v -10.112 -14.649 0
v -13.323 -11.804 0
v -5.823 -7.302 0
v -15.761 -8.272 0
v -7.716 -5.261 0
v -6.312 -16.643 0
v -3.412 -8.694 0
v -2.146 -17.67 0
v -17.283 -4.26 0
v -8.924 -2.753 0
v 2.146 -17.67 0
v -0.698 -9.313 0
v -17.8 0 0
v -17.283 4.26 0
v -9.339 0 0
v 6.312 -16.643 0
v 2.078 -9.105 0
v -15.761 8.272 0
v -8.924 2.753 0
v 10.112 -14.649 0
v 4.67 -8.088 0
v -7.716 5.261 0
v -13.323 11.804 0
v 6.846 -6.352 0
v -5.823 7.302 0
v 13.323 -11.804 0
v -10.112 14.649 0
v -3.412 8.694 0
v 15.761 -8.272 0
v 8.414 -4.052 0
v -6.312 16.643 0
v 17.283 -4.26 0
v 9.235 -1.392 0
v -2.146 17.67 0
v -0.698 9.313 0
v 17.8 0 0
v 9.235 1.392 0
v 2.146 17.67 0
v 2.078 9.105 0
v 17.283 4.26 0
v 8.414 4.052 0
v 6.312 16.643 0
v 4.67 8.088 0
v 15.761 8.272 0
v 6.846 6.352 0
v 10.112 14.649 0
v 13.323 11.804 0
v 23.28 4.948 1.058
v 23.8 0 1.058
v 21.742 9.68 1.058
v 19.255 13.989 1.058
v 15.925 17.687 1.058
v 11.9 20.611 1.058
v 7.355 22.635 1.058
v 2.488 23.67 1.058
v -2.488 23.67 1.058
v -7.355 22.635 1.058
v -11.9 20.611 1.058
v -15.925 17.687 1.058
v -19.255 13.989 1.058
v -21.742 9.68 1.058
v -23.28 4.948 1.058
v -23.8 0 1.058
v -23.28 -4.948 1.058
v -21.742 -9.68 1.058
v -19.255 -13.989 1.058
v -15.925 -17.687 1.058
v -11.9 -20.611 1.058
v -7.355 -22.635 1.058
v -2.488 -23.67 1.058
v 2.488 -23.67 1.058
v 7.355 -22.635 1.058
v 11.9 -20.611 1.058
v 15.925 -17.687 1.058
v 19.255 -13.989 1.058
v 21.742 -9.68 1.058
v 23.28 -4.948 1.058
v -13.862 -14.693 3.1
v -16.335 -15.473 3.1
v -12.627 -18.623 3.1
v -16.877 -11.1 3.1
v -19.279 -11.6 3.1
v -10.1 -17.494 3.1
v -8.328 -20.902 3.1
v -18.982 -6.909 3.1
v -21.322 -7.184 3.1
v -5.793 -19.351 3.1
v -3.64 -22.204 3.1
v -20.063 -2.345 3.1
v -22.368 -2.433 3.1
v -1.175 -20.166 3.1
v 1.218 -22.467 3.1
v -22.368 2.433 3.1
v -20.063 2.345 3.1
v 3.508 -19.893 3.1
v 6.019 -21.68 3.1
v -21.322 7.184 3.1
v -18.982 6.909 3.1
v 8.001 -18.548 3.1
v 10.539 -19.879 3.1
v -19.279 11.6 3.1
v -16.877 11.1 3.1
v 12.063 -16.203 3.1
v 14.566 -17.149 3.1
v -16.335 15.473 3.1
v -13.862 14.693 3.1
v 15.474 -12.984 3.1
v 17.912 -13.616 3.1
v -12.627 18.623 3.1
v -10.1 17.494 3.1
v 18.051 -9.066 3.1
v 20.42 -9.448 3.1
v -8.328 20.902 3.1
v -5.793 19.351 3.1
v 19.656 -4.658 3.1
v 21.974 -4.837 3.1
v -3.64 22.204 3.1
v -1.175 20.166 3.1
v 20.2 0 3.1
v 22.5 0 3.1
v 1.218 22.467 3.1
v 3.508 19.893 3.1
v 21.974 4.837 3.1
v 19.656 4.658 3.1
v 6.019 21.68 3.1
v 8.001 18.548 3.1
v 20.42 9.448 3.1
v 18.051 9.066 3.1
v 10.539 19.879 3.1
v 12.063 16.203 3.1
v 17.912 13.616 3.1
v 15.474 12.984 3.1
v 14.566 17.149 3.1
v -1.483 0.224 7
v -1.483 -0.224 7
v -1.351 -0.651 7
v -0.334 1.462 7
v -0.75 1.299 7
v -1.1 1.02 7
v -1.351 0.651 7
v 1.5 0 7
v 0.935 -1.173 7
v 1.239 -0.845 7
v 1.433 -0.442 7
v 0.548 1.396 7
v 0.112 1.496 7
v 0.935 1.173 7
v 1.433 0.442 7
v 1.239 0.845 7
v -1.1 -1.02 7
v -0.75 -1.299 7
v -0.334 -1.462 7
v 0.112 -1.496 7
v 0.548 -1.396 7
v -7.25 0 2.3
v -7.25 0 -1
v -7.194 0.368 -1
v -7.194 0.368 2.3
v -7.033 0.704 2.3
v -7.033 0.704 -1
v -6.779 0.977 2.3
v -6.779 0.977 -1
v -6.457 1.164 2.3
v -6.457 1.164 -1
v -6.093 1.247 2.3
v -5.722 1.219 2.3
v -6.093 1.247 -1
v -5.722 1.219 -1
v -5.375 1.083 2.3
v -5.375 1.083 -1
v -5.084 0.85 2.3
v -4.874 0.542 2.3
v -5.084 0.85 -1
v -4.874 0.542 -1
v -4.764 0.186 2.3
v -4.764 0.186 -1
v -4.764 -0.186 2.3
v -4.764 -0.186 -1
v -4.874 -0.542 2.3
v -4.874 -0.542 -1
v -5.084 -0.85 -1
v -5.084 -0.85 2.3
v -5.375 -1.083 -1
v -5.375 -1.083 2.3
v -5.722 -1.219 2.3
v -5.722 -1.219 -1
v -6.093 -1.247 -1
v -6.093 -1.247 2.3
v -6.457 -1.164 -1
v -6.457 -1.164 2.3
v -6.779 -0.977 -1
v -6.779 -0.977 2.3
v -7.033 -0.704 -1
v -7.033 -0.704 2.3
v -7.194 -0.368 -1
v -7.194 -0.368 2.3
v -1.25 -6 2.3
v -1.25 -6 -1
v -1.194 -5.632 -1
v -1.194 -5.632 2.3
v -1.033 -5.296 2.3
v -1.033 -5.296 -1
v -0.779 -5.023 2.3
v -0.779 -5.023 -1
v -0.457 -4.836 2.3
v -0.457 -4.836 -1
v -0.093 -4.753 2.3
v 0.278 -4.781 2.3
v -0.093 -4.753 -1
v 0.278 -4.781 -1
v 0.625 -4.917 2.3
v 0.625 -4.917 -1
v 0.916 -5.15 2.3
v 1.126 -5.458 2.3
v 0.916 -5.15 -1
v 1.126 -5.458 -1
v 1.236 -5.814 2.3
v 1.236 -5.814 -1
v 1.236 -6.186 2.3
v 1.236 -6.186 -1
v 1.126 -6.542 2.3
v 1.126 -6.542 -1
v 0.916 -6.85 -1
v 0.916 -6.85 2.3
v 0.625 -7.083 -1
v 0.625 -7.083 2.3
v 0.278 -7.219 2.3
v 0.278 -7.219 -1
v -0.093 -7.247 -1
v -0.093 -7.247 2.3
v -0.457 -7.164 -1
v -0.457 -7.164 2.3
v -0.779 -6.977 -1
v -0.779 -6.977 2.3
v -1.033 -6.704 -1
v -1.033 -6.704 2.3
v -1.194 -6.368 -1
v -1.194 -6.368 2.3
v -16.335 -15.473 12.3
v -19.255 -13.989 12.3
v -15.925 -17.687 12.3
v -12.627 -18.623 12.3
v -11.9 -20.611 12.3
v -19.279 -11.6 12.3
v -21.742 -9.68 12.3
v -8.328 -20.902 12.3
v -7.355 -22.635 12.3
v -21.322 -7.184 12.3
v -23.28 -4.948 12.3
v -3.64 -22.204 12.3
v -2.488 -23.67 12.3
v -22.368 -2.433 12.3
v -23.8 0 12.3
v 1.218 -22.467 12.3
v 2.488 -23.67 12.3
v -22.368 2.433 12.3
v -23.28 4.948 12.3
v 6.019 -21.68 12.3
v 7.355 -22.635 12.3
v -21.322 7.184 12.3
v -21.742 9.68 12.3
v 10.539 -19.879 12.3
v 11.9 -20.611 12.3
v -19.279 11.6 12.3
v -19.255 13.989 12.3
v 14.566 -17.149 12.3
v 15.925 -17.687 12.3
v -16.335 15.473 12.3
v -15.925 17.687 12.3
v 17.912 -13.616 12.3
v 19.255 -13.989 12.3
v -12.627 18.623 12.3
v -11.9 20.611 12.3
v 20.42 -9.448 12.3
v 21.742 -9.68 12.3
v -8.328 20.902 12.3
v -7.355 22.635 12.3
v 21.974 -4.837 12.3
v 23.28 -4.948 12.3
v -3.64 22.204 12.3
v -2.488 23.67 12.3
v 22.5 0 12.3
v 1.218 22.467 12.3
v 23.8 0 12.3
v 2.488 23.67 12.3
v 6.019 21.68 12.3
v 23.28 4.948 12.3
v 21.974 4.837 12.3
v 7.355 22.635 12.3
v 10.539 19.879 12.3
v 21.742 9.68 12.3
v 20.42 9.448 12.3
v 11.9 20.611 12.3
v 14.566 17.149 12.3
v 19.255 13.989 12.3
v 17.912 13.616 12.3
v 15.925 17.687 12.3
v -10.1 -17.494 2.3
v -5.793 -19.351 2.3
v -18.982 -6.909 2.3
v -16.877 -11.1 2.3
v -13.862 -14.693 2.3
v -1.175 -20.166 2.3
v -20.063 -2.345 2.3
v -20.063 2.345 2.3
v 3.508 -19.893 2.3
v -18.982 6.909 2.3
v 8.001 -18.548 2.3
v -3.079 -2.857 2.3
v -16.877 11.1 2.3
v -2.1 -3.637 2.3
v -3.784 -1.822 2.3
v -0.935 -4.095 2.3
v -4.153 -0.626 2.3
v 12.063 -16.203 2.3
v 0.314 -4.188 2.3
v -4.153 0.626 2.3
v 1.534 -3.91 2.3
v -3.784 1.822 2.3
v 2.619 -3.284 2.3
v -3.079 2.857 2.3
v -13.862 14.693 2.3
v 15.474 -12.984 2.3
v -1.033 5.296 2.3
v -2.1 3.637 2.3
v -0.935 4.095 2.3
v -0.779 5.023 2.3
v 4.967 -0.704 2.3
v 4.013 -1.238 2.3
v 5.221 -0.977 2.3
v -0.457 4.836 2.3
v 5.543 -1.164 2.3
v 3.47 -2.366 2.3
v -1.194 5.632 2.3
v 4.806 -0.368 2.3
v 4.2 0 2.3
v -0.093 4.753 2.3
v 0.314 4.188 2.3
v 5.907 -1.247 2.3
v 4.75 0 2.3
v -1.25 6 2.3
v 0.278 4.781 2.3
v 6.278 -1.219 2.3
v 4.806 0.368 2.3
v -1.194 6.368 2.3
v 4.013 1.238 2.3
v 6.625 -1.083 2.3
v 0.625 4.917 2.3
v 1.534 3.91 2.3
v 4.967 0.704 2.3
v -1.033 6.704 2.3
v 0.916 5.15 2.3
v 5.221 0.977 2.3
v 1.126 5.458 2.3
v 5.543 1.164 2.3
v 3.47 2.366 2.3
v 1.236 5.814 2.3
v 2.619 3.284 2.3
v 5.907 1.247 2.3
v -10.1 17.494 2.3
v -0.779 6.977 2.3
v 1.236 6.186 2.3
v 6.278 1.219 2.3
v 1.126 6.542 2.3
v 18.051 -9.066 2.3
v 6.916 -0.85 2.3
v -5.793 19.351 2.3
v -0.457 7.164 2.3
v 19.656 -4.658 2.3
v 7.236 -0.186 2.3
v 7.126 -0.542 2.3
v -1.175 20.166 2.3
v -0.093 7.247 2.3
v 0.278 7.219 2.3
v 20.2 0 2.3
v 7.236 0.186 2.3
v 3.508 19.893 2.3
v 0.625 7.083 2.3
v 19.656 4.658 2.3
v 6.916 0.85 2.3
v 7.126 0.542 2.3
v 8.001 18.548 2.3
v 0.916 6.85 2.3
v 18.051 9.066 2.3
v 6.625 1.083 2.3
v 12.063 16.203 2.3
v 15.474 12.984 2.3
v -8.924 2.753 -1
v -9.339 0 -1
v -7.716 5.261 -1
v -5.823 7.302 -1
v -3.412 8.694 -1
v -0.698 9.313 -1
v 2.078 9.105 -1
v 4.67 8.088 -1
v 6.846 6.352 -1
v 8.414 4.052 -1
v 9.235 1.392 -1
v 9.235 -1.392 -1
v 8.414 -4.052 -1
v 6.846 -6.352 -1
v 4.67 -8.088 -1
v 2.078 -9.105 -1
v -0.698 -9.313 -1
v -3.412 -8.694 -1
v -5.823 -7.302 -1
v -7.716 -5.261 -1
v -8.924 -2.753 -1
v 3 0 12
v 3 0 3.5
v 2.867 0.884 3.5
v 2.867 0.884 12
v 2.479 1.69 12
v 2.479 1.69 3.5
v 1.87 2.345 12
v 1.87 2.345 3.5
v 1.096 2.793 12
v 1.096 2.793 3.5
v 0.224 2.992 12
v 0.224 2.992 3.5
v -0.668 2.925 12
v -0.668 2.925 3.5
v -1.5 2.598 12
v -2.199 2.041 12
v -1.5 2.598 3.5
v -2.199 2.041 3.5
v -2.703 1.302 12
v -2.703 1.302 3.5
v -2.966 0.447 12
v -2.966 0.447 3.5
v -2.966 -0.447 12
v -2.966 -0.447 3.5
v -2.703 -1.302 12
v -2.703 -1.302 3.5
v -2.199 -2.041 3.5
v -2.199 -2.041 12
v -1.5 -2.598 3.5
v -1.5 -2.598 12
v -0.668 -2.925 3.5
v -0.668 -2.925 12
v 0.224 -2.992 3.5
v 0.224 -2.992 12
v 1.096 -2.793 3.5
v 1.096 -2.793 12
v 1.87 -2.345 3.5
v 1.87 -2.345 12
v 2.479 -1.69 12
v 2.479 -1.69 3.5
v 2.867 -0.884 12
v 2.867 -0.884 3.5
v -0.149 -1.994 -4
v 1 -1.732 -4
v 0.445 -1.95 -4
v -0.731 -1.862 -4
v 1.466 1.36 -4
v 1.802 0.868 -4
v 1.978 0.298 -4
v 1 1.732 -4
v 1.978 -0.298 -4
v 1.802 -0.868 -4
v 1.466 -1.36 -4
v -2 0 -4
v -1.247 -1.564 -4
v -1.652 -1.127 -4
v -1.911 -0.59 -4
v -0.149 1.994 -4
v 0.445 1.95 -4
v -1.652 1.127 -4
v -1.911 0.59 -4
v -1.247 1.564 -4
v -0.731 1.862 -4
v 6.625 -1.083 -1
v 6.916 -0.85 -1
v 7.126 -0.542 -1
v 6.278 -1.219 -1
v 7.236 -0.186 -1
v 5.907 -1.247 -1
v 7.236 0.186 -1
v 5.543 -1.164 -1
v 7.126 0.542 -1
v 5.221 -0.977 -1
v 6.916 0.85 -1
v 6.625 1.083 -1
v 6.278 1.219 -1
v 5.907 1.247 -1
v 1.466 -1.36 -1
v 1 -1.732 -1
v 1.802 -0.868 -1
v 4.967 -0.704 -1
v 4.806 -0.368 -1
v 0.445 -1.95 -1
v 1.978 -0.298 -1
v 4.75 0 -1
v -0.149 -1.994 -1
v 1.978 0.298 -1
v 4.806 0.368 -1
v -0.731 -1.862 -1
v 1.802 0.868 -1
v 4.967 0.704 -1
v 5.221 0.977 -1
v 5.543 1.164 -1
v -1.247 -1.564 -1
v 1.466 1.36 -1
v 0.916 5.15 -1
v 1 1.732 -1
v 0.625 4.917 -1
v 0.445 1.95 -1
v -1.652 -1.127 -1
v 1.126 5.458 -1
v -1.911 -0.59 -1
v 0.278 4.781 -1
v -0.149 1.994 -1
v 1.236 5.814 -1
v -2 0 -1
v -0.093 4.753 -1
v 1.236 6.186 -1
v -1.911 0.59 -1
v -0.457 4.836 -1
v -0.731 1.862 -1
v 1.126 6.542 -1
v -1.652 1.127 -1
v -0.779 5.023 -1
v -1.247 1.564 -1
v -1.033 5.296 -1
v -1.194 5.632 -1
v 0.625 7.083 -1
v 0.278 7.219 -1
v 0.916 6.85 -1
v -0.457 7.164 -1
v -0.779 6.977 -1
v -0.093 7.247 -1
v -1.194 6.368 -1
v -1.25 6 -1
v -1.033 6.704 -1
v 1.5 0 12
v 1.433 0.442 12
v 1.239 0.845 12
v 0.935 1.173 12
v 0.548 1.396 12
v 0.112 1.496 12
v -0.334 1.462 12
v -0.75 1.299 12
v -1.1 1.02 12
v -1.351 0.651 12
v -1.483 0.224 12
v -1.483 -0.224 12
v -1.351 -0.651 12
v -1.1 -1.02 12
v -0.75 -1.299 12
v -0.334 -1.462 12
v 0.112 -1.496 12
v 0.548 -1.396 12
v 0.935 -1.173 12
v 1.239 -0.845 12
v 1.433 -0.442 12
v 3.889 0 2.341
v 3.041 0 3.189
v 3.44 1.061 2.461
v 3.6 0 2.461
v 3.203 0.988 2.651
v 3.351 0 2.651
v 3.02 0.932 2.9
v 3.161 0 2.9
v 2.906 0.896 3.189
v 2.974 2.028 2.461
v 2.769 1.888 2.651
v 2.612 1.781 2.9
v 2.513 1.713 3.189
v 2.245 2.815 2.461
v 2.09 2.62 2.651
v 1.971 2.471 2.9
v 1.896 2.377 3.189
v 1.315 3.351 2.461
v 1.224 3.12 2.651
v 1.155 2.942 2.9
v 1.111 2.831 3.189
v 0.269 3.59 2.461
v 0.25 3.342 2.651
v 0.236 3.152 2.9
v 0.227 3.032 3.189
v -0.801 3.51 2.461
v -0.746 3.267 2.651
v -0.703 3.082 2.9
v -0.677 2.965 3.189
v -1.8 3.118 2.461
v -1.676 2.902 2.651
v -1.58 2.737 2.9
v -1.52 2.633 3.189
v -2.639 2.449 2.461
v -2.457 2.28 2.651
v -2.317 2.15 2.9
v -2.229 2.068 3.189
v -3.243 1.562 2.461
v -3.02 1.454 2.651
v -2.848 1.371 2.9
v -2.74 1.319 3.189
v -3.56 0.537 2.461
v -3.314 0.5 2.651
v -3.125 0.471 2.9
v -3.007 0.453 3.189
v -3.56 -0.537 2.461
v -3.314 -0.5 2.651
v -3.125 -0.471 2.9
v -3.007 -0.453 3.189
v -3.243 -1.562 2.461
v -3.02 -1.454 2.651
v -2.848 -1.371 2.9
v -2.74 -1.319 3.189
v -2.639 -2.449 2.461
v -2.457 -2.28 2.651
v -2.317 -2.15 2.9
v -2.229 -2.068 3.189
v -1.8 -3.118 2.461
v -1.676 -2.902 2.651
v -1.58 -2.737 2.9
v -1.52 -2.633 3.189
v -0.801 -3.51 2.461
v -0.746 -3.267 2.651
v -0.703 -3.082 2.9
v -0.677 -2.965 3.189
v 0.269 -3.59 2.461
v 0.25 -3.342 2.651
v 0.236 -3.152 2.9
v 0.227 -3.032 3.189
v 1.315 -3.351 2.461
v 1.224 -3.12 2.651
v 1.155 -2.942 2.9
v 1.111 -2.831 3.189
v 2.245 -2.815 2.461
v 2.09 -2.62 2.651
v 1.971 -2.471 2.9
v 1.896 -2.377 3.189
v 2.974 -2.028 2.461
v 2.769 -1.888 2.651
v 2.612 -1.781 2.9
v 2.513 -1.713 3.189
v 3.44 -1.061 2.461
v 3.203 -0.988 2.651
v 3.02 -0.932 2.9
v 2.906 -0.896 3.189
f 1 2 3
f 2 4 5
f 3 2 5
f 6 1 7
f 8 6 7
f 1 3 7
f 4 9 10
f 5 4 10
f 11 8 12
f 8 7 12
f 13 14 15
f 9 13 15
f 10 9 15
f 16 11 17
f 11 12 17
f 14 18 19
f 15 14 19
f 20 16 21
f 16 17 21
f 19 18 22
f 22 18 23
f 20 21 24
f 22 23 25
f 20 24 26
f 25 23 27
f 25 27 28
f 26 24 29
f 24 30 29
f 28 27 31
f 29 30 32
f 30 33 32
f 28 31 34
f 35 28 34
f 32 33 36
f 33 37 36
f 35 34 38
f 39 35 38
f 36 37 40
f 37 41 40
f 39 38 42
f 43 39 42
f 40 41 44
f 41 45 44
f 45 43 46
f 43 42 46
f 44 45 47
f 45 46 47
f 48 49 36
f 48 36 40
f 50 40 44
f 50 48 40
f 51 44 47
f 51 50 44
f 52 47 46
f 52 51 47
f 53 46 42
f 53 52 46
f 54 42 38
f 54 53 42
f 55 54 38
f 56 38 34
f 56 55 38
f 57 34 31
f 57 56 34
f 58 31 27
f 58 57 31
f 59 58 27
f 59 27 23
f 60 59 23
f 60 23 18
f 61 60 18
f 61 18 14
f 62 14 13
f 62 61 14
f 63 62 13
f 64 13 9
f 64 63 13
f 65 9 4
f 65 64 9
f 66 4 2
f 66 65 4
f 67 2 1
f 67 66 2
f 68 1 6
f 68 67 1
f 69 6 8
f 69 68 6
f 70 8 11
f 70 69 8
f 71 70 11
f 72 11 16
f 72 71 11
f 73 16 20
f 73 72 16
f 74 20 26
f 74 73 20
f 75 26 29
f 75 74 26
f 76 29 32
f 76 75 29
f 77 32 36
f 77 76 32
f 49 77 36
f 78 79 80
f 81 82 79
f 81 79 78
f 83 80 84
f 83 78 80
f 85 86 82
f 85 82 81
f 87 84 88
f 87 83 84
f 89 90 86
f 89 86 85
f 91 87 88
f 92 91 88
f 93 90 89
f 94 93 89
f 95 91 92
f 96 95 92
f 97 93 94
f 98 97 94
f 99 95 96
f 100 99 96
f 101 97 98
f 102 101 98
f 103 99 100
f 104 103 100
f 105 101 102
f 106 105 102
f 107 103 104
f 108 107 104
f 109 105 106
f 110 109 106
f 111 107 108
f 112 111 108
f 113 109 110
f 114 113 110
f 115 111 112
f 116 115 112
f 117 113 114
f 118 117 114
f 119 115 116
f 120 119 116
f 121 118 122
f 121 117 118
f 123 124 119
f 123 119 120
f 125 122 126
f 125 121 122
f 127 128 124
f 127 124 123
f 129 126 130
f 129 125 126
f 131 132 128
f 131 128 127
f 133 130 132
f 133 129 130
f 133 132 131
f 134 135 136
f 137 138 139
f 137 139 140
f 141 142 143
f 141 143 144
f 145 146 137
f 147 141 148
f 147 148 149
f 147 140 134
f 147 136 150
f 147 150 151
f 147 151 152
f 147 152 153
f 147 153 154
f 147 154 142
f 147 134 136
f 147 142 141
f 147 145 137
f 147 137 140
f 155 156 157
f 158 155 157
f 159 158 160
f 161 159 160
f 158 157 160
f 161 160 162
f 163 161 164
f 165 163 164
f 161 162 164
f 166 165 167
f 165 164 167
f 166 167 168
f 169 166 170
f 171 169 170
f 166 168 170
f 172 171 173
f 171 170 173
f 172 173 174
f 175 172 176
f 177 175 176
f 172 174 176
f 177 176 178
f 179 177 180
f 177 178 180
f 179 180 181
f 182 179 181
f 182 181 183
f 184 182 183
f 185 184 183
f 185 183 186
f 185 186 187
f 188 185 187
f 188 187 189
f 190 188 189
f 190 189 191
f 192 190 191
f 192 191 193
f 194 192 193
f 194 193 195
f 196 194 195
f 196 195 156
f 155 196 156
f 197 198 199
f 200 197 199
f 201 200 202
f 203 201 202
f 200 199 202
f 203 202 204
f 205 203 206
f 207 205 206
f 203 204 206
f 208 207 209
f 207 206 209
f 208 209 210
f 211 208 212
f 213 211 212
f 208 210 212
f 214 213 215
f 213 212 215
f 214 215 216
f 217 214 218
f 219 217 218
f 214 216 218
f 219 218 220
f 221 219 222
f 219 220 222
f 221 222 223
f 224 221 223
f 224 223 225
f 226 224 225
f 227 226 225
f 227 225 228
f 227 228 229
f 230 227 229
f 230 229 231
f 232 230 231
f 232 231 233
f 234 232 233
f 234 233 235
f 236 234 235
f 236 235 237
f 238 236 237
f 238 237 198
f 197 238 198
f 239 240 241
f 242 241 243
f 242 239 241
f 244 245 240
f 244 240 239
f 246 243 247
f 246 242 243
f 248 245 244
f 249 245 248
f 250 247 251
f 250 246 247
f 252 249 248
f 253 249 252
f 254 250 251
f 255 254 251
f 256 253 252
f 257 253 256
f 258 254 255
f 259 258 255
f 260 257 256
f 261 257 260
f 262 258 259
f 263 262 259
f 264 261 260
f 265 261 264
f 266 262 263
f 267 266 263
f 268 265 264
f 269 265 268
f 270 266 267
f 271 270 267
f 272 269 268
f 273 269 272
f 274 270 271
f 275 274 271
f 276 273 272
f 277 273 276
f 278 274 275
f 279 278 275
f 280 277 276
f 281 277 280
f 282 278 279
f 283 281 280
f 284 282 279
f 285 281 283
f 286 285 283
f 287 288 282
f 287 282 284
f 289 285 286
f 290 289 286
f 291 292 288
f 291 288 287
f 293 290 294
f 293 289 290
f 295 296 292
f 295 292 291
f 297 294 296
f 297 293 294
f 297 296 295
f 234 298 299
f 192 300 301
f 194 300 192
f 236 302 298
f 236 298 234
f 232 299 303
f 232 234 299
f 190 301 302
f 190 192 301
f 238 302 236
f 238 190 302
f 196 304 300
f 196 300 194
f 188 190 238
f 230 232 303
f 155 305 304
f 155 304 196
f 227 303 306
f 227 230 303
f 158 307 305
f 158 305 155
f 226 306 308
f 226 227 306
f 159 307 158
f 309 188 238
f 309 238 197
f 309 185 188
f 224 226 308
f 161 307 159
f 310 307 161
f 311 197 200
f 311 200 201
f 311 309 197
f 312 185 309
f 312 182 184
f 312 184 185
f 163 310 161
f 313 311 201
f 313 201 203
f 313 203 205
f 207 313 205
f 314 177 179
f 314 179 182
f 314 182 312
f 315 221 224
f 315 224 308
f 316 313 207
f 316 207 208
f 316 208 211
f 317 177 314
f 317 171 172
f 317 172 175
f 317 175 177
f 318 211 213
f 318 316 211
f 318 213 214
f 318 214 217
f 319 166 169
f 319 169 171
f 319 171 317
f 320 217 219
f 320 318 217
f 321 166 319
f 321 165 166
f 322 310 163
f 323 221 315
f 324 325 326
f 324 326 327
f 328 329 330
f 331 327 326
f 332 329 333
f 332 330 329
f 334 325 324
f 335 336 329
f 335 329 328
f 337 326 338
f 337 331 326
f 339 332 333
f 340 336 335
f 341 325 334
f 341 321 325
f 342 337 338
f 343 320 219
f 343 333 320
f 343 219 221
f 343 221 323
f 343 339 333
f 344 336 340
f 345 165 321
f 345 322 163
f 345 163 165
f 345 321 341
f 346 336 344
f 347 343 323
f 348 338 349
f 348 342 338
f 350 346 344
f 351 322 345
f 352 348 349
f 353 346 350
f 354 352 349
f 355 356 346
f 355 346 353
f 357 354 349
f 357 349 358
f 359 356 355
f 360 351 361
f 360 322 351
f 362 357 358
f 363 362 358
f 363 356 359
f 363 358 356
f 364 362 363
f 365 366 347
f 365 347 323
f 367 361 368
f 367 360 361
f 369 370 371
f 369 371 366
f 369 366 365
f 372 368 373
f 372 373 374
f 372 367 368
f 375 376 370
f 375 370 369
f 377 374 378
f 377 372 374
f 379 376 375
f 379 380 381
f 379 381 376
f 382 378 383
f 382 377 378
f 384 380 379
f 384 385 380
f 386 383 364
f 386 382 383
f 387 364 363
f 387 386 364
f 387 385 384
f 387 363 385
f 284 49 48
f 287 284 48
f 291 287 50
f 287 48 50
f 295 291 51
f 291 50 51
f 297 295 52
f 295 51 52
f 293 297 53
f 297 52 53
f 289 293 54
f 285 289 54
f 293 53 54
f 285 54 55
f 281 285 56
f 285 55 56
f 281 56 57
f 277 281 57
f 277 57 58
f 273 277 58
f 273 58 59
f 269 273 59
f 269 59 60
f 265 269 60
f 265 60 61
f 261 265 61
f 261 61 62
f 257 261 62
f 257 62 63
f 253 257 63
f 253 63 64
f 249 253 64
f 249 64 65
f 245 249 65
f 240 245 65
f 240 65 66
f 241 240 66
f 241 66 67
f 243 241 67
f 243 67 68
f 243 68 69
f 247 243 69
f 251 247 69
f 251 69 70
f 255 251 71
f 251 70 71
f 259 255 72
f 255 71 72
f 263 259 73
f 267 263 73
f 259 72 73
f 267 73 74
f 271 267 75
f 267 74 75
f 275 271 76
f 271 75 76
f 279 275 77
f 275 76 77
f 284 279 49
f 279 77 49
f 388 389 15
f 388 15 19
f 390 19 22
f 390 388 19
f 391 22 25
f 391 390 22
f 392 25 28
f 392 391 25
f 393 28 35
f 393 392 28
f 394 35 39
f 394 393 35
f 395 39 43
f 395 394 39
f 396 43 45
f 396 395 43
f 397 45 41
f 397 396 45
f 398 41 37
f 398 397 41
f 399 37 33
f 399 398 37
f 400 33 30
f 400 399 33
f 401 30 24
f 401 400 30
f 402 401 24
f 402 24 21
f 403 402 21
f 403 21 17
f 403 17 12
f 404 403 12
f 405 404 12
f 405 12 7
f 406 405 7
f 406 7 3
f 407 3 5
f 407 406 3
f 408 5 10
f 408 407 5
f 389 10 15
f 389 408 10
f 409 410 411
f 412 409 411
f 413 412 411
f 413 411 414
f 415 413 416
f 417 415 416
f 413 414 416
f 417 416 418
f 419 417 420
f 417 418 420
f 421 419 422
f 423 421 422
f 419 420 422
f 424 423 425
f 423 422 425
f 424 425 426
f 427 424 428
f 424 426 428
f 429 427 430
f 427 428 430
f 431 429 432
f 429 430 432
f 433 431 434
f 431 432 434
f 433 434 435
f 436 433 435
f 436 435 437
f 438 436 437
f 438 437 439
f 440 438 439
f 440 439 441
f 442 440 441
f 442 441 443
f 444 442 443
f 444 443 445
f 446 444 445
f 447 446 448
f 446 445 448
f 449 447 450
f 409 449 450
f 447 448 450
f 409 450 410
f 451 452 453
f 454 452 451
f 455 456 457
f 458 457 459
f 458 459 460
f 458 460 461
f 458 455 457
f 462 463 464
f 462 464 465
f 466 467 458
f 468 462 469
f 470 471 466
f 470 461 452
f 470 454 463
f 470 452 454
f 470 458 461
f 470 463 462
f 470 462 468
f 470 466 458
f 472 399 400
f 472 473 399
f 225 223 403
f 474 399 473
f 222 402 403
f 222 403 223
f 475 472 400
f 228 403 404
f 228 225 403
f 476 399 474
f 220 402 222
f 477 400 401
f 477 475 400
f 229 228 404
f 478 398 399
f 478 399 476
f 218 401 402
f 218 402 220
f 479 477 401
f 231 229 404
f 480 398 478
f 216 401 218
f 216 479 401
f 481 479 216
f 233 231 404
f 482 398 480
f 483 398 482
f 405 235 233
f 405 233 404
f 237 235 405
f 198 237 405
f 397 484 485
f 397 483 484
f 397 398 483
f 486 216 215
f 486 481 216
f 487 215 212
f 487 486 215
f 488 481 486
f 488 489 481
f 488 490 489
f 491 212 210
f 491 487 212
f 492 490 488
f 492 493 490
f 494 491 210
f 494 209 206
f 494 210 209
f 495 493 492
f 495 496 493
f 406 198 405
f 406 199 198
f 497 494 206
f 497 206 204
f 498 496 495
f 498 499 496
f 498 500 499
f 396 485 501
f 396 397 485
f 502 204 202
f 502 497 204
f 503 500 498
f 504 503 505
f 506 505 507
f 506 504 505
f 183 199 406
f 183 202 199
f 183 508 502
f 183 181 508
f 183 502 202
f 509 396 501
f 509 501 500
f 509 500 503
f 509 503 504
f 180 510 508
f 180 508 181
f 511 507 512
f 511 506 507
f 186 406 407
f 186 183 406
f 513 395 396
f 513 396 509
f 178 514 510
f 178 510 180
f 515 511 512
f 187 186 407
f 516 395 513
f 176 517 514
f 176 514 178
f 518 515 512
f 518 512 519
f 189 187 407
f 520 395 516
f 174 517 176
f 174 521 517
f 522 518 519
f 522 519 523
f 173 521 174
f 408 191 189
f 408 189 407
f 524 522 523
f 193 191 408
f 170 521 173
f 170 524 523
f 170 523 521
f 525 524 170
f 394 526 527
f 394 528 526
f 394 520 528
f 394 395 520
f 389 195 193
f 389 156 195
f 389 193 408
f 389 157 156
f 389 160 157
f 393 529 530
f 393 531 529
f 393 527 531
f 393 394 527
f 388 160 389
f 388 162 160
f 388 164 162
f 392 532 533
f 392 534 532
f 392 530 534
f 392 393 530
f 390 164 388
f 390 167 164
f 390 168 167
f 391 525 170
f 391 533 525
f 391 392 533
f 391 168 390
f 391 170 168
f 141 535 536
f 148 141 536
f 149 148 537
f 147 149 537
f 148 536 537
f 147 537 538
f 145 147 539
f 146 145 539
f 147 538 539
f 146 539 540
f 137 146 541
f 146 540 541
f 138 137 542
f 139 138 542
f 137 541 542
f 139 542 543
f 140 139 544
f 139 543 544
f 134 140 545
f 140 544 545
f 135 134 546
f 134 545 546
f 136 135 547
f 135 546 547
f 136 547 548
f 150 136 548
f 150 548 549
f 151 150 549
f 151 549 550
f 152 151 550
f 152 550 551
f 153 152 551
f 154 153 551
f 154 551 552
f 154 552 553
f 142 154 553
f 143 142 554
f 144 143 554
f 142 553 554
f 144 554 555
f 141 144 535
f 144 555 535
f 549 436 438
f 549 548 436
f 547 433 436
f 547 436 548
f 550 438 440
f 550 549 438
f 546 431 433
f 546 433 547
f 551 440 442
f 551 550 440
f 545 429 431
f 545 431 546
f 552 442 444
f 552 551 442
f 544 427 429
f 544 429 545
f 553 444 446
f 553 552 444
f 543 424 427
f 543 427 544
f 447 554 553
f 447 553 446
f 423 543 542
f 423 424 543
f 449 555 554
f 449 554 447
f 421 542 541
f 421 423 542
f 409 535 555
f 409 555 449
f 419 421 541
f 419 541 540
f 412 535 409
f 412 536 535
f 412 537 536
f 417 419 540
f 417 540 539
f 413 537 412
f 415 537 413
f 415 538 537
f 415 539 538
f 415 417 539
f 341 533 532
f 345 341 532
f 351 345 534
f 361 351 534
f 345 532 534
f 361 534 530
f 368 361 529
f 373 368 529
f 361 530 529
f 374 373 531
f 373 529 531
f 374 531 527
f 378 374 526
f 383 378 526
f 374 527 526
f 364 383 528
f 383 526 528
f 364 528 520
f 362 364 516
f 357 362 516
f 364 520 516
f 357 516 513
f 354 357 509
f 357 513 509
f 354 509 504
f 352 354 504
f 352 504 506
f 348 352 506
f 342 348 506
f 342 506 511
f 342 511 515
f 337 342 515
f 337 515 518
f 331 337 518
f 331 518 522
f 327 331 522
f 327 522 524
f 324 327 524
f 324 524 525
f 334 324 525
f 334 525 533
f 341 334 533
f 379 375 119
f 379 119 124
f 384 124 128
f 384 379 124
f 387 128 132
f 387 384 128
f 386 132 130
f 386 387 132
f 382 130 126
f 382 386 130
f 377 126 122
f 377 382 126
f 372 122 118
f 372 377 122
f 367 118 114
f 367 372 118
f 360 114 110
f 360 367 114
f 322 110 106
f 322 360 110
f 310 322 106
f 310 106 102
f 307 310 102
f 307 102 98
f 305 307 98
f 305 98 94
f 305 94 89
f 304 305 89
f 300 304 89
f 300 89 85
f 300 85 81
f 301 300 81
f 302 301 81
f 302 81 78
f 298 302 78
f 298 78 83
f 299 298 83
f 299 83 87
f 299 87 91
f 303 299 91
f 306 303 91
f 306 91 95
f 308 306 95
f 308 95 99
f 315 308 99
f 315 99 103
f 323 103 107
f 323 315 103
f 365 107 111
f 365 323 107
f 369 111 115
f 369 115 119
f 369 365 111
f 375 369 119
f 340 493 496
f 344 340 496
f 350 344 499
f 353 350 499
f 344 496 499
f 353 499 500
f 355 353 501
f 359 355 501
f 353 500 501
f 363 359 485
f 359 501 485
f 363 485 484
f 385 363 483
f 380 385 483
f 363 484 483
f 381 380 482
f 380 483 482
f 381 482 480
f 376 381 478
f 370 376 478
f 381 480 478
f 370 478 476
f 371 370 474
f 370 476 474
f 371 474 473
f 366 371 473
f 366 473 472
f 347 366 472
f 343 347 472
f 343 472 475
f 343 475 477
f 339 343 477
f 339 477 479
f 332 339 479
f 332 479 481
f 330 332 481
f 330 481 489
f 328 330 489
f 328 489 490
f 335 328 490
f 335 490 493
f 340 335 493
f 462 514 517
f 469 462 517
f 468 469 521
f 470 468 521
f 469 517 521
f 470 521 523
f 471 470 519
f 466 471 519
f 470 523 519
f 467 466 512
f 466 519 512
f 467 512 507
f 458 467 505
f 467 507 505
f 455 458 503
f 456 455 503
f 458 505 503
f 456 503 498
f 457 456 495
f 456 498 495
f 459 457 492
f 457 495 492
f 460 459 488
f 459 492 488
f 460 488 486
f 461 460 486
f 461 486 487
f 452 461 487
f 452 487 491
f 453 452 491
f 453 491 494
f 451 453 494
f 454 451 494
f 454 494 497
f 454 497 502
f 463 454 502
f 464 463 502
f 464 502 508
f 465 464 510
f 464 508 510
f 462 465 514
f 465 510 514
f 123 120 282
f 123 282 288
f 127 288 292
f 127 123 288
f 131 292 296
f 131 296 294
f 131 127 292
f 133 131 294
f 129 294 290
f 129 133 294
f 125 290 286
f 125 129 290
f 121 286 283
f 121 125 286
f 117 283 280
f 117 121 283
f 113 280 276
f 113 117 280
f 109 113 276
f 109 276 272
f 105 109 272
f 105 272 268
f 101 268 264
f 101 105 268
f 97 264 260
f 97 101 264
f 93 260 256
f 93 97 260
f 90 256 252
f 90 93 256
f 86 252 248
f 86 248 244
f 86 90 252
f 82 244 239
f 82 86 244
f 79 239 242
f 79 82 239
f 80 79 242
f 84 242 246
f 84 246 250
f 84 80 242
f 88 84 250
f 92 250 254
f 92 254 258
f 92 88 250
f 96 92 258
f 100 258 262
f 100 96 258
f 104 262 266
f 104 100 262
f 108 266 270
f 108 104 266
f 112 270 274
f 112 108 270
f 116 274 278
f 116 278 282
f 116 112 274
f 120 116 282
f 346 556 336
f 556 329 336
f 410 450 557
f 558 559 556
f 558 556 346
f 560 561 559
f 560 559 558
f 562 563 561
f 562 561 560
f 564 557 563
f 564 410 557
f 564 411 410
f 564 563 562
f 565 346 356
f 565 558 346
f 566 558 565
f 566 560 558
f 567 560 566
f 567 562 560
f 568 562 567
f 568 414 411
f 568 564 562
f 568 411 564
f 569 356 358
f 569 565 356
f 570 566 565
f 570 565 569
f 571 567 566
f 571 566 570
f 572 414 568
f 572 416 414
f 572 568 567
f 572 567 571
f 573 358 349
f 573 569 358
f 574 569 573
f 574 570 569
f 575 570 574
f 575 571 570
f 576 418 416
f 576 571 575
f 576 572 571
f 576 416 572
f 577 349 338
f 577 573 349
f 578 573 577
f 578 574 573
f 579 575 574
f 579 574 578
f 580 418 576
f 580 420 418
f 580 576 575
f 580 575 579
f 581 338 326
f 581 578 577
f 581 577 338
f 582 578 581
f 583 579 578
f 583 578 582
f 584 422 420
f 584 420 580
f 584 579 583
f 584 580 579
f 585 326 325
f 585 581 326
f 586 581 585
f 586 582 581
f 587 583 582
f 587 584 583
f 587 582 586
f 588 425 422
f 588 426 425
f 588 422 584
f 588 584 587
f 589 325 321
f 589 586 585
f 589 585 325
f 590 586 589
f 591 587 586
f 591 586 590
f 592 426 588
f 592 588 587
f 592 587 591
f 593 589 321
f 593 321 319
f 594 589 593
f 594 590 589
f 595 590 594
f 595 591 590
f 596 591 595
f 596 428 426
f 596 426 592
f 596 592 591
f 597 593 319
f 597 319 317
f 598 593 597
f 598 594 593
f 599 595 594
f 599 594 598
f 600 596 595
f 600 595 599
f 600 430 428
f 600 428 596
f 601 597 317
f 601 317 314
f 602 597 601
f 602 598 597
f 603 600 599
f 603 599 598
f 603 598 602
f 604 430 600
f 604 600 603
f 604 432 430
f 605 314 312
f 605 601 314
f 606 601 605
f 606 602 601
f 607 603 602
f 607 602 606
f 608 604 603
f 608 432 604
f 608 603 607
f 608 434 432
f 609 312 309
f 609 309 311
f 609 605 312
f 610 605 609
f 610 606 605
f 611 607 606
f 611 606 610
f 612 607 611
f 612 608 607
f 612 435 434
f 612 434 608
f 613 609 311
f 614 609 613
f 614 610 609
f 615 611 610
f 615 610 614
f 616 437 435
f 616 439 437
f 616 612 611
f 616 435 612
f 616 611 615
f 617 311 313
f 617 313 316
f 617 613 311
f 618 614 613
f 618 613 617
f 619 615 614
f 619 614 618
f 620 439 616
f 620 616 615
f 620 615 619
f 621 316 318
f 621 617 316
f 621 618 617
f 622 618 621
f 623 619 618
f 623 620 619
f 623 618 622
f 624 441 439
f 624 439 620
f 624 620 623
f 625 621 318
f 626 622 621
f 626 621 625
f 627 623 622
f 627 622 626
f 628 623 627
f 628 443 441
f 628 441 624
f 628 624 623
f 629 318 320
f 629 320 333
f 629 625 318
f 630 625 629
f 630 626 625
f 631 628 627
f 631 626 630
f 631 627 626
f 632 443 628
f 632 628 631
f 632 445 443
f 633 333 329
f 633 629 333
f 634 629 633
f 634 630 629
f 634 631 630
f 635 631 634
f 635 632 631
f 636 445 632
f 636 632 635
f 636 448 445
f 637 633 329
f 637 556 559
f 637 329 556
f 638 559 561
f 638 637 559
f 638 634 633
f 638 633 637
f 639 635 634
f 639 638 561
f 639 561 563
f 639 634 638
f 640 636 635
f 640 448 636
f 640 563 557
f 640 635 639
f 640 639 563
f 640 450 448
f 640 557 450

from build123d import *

# Parameters (mm, degrees)
SKETCH1_R               = 23.8
BOSS_EXTRUDE1_DEPTH     = 2.3
SKETCH2_R               = 23.8
SKETCH2_R_2             = 20.2
BOSS_EXTRUDE2_DEPTH     = 10
SKETCH3_R               = 3
BOSS_EXTRUDE3_DEPTH     = 9.7
CHAMFER1_SIZE           = 6
CHAMFER1_SIZE2          = 1.057961884
SKETCH4_R               = 1.25
CUT_EXTRUDE1_DEPTH      = 15
CUT_EXTRUDE3_START      = -9.2
SKETCH6_R               = 22.5
SKETCH6_R_2             = 20.2
CUT_EXTRUDE3_DEPTH      = 9.2
SKETCH7_R               = 1.5
CUT_EXTRUDE4_DEPTH      = 5
REDONDEO1_R             = 1.2
SALIENTE_EXTRUIR1_START = 1
CROQUIS1_R              = 9.339254136
CROQUIS1_R_2            = 1.25
SALIENTE_EXTRUIR1_DEPTH = 1
CROQUIS2_R              = 2
SALIENTE_EXTRUIR2_DEPTH = 3


with BuildPart() as part:
    # Sketch1 → Boss-Extrude1 (new body)
    with BuildSketch(Plane.XY):
        Circle(SKETCH1_R)
    extrude(amount=BOSS_EXTRUDE1_DEPTH)

    # Sketch2 → Boss-Extrude2 (add)
    with BuildSketch(Plane.XY.offset(2.3)):
        Circle(SKETCH2_R)
        Circle(SKETCH2_R_2, mode=Mode.SUBTRACT)
    extrude(amount=BOSS_EXTRUDE2_DEPTH)

    # Sketch3 → Boss-Extrude3 (add)
    with BuildSketch(Plane.XY.offset(2.3)):
        Circle(SKETCH3_R)
    extrude(amount=BOSS_EXTRUDE3_DEPTH)

    # Chamfer1
    chamfer1_edges = [part.edges().sort_by_distance(p)[0] for p in [
        (-23.8, 0, 0),
    ]]
    chamfer1_side = [part.faces().sort_by_distance(p)[0] for p in [
        (0, 0, 0),
    ]]
    chamfer(chamfer1_edges, length=CHAMFER1_SIZE, length2=CHAMFER1_SIZE2, reference=chamfer1_side[0])

    # Sketch4 → Cut-Extrude1 (cut)
    with BuildSketch(Plane(origin=(0, 0, 0), x_dir=(-1, 0, 0), z_dir=(0, 0, -1))):
        with Locations((6, 0)):
            Circle(SKETCH4_R)
        with Locations((0, -6)):
            Circle(SKETCH4_R)
        with Locations((-6, 0)):
            Circle(SKETCH4_R)
        with Locations((0, 6)):
            Circle(SKETCH4_R)
    extrude(amount=-CUT_EXTRUDE1_DEPTH, mode=Mode.SUBTRACT)

    # Sketch6 → Cut-Extrude3 (cut)
    with BuildSketch(Plane.XY.offset(12.3).offset(CUT_EXTRUDE3_START)):
        Circle(SKETCH6_R)
        Circle(SKETCH6_R_2, mode=Mode.SUBTRACT)
    extrude(amount=CUT_EXTRUDE3_DEPTH, mode=Mode.SUBTRACT)

    # Sketch7 → Cut-Extrude4 (cut)
    with BuildSketch(Plane.XY.offset(12)):
        Circle(SKETCH7_R)
    extrude(amount=-CUT_EXTRUDE4_DEPTH, mode=Mode.SUBTRACT)

    # Redondeo1
    redondeo1_edges = [part.edges().sort_by_distance(p)[0] for p in [
        (-3, 0, 2.3),
    ]]
    fillet(redondeo1_edges, radius=REDONDEO1_R)

    # Croquis1 → Saliente-Extruir1 (add)
    with BuildSketch(Plane(origin=(0, 0, 0), x_dir=(-1, 0, 0), z_dir=(0, 0, -1)).offset(SALIENTE_EXTRUIR1_START)):
        Circle(CROQUIS1_R)
        with Locations((0, 6)):
            Circle(CROQUIS1_R_2, mode=Mode.SUBTRACT)
        with Locations((6, 0)):
            Circle(CROQUIS1_R_2, mode=Mode.SUBTRACT)
        with Locations((0, -6)):
            Circle(CROQUIS1_R_2, mode=Mode.SUBTRACT)
        with Locations((-6, 0)):
            Circle(CROQUIS1_R_2, mode=Mode.SUBTRACT)
    extrude(amount=-SALIENTE_EXTRUIR1_DEPTH)

    # Croquis2 → Saliente-Extruir2 (add)
    with BuildSketch(Plane(origin=(0, 0, -1), x_dir=(-1, 0, 0), z_dir=(0, 0, -1))):
        Circle(CROQUIS2_R)
    extrude(amount=SALIENTE_EXTRUIR2_DEPTH)


solid = part.part
